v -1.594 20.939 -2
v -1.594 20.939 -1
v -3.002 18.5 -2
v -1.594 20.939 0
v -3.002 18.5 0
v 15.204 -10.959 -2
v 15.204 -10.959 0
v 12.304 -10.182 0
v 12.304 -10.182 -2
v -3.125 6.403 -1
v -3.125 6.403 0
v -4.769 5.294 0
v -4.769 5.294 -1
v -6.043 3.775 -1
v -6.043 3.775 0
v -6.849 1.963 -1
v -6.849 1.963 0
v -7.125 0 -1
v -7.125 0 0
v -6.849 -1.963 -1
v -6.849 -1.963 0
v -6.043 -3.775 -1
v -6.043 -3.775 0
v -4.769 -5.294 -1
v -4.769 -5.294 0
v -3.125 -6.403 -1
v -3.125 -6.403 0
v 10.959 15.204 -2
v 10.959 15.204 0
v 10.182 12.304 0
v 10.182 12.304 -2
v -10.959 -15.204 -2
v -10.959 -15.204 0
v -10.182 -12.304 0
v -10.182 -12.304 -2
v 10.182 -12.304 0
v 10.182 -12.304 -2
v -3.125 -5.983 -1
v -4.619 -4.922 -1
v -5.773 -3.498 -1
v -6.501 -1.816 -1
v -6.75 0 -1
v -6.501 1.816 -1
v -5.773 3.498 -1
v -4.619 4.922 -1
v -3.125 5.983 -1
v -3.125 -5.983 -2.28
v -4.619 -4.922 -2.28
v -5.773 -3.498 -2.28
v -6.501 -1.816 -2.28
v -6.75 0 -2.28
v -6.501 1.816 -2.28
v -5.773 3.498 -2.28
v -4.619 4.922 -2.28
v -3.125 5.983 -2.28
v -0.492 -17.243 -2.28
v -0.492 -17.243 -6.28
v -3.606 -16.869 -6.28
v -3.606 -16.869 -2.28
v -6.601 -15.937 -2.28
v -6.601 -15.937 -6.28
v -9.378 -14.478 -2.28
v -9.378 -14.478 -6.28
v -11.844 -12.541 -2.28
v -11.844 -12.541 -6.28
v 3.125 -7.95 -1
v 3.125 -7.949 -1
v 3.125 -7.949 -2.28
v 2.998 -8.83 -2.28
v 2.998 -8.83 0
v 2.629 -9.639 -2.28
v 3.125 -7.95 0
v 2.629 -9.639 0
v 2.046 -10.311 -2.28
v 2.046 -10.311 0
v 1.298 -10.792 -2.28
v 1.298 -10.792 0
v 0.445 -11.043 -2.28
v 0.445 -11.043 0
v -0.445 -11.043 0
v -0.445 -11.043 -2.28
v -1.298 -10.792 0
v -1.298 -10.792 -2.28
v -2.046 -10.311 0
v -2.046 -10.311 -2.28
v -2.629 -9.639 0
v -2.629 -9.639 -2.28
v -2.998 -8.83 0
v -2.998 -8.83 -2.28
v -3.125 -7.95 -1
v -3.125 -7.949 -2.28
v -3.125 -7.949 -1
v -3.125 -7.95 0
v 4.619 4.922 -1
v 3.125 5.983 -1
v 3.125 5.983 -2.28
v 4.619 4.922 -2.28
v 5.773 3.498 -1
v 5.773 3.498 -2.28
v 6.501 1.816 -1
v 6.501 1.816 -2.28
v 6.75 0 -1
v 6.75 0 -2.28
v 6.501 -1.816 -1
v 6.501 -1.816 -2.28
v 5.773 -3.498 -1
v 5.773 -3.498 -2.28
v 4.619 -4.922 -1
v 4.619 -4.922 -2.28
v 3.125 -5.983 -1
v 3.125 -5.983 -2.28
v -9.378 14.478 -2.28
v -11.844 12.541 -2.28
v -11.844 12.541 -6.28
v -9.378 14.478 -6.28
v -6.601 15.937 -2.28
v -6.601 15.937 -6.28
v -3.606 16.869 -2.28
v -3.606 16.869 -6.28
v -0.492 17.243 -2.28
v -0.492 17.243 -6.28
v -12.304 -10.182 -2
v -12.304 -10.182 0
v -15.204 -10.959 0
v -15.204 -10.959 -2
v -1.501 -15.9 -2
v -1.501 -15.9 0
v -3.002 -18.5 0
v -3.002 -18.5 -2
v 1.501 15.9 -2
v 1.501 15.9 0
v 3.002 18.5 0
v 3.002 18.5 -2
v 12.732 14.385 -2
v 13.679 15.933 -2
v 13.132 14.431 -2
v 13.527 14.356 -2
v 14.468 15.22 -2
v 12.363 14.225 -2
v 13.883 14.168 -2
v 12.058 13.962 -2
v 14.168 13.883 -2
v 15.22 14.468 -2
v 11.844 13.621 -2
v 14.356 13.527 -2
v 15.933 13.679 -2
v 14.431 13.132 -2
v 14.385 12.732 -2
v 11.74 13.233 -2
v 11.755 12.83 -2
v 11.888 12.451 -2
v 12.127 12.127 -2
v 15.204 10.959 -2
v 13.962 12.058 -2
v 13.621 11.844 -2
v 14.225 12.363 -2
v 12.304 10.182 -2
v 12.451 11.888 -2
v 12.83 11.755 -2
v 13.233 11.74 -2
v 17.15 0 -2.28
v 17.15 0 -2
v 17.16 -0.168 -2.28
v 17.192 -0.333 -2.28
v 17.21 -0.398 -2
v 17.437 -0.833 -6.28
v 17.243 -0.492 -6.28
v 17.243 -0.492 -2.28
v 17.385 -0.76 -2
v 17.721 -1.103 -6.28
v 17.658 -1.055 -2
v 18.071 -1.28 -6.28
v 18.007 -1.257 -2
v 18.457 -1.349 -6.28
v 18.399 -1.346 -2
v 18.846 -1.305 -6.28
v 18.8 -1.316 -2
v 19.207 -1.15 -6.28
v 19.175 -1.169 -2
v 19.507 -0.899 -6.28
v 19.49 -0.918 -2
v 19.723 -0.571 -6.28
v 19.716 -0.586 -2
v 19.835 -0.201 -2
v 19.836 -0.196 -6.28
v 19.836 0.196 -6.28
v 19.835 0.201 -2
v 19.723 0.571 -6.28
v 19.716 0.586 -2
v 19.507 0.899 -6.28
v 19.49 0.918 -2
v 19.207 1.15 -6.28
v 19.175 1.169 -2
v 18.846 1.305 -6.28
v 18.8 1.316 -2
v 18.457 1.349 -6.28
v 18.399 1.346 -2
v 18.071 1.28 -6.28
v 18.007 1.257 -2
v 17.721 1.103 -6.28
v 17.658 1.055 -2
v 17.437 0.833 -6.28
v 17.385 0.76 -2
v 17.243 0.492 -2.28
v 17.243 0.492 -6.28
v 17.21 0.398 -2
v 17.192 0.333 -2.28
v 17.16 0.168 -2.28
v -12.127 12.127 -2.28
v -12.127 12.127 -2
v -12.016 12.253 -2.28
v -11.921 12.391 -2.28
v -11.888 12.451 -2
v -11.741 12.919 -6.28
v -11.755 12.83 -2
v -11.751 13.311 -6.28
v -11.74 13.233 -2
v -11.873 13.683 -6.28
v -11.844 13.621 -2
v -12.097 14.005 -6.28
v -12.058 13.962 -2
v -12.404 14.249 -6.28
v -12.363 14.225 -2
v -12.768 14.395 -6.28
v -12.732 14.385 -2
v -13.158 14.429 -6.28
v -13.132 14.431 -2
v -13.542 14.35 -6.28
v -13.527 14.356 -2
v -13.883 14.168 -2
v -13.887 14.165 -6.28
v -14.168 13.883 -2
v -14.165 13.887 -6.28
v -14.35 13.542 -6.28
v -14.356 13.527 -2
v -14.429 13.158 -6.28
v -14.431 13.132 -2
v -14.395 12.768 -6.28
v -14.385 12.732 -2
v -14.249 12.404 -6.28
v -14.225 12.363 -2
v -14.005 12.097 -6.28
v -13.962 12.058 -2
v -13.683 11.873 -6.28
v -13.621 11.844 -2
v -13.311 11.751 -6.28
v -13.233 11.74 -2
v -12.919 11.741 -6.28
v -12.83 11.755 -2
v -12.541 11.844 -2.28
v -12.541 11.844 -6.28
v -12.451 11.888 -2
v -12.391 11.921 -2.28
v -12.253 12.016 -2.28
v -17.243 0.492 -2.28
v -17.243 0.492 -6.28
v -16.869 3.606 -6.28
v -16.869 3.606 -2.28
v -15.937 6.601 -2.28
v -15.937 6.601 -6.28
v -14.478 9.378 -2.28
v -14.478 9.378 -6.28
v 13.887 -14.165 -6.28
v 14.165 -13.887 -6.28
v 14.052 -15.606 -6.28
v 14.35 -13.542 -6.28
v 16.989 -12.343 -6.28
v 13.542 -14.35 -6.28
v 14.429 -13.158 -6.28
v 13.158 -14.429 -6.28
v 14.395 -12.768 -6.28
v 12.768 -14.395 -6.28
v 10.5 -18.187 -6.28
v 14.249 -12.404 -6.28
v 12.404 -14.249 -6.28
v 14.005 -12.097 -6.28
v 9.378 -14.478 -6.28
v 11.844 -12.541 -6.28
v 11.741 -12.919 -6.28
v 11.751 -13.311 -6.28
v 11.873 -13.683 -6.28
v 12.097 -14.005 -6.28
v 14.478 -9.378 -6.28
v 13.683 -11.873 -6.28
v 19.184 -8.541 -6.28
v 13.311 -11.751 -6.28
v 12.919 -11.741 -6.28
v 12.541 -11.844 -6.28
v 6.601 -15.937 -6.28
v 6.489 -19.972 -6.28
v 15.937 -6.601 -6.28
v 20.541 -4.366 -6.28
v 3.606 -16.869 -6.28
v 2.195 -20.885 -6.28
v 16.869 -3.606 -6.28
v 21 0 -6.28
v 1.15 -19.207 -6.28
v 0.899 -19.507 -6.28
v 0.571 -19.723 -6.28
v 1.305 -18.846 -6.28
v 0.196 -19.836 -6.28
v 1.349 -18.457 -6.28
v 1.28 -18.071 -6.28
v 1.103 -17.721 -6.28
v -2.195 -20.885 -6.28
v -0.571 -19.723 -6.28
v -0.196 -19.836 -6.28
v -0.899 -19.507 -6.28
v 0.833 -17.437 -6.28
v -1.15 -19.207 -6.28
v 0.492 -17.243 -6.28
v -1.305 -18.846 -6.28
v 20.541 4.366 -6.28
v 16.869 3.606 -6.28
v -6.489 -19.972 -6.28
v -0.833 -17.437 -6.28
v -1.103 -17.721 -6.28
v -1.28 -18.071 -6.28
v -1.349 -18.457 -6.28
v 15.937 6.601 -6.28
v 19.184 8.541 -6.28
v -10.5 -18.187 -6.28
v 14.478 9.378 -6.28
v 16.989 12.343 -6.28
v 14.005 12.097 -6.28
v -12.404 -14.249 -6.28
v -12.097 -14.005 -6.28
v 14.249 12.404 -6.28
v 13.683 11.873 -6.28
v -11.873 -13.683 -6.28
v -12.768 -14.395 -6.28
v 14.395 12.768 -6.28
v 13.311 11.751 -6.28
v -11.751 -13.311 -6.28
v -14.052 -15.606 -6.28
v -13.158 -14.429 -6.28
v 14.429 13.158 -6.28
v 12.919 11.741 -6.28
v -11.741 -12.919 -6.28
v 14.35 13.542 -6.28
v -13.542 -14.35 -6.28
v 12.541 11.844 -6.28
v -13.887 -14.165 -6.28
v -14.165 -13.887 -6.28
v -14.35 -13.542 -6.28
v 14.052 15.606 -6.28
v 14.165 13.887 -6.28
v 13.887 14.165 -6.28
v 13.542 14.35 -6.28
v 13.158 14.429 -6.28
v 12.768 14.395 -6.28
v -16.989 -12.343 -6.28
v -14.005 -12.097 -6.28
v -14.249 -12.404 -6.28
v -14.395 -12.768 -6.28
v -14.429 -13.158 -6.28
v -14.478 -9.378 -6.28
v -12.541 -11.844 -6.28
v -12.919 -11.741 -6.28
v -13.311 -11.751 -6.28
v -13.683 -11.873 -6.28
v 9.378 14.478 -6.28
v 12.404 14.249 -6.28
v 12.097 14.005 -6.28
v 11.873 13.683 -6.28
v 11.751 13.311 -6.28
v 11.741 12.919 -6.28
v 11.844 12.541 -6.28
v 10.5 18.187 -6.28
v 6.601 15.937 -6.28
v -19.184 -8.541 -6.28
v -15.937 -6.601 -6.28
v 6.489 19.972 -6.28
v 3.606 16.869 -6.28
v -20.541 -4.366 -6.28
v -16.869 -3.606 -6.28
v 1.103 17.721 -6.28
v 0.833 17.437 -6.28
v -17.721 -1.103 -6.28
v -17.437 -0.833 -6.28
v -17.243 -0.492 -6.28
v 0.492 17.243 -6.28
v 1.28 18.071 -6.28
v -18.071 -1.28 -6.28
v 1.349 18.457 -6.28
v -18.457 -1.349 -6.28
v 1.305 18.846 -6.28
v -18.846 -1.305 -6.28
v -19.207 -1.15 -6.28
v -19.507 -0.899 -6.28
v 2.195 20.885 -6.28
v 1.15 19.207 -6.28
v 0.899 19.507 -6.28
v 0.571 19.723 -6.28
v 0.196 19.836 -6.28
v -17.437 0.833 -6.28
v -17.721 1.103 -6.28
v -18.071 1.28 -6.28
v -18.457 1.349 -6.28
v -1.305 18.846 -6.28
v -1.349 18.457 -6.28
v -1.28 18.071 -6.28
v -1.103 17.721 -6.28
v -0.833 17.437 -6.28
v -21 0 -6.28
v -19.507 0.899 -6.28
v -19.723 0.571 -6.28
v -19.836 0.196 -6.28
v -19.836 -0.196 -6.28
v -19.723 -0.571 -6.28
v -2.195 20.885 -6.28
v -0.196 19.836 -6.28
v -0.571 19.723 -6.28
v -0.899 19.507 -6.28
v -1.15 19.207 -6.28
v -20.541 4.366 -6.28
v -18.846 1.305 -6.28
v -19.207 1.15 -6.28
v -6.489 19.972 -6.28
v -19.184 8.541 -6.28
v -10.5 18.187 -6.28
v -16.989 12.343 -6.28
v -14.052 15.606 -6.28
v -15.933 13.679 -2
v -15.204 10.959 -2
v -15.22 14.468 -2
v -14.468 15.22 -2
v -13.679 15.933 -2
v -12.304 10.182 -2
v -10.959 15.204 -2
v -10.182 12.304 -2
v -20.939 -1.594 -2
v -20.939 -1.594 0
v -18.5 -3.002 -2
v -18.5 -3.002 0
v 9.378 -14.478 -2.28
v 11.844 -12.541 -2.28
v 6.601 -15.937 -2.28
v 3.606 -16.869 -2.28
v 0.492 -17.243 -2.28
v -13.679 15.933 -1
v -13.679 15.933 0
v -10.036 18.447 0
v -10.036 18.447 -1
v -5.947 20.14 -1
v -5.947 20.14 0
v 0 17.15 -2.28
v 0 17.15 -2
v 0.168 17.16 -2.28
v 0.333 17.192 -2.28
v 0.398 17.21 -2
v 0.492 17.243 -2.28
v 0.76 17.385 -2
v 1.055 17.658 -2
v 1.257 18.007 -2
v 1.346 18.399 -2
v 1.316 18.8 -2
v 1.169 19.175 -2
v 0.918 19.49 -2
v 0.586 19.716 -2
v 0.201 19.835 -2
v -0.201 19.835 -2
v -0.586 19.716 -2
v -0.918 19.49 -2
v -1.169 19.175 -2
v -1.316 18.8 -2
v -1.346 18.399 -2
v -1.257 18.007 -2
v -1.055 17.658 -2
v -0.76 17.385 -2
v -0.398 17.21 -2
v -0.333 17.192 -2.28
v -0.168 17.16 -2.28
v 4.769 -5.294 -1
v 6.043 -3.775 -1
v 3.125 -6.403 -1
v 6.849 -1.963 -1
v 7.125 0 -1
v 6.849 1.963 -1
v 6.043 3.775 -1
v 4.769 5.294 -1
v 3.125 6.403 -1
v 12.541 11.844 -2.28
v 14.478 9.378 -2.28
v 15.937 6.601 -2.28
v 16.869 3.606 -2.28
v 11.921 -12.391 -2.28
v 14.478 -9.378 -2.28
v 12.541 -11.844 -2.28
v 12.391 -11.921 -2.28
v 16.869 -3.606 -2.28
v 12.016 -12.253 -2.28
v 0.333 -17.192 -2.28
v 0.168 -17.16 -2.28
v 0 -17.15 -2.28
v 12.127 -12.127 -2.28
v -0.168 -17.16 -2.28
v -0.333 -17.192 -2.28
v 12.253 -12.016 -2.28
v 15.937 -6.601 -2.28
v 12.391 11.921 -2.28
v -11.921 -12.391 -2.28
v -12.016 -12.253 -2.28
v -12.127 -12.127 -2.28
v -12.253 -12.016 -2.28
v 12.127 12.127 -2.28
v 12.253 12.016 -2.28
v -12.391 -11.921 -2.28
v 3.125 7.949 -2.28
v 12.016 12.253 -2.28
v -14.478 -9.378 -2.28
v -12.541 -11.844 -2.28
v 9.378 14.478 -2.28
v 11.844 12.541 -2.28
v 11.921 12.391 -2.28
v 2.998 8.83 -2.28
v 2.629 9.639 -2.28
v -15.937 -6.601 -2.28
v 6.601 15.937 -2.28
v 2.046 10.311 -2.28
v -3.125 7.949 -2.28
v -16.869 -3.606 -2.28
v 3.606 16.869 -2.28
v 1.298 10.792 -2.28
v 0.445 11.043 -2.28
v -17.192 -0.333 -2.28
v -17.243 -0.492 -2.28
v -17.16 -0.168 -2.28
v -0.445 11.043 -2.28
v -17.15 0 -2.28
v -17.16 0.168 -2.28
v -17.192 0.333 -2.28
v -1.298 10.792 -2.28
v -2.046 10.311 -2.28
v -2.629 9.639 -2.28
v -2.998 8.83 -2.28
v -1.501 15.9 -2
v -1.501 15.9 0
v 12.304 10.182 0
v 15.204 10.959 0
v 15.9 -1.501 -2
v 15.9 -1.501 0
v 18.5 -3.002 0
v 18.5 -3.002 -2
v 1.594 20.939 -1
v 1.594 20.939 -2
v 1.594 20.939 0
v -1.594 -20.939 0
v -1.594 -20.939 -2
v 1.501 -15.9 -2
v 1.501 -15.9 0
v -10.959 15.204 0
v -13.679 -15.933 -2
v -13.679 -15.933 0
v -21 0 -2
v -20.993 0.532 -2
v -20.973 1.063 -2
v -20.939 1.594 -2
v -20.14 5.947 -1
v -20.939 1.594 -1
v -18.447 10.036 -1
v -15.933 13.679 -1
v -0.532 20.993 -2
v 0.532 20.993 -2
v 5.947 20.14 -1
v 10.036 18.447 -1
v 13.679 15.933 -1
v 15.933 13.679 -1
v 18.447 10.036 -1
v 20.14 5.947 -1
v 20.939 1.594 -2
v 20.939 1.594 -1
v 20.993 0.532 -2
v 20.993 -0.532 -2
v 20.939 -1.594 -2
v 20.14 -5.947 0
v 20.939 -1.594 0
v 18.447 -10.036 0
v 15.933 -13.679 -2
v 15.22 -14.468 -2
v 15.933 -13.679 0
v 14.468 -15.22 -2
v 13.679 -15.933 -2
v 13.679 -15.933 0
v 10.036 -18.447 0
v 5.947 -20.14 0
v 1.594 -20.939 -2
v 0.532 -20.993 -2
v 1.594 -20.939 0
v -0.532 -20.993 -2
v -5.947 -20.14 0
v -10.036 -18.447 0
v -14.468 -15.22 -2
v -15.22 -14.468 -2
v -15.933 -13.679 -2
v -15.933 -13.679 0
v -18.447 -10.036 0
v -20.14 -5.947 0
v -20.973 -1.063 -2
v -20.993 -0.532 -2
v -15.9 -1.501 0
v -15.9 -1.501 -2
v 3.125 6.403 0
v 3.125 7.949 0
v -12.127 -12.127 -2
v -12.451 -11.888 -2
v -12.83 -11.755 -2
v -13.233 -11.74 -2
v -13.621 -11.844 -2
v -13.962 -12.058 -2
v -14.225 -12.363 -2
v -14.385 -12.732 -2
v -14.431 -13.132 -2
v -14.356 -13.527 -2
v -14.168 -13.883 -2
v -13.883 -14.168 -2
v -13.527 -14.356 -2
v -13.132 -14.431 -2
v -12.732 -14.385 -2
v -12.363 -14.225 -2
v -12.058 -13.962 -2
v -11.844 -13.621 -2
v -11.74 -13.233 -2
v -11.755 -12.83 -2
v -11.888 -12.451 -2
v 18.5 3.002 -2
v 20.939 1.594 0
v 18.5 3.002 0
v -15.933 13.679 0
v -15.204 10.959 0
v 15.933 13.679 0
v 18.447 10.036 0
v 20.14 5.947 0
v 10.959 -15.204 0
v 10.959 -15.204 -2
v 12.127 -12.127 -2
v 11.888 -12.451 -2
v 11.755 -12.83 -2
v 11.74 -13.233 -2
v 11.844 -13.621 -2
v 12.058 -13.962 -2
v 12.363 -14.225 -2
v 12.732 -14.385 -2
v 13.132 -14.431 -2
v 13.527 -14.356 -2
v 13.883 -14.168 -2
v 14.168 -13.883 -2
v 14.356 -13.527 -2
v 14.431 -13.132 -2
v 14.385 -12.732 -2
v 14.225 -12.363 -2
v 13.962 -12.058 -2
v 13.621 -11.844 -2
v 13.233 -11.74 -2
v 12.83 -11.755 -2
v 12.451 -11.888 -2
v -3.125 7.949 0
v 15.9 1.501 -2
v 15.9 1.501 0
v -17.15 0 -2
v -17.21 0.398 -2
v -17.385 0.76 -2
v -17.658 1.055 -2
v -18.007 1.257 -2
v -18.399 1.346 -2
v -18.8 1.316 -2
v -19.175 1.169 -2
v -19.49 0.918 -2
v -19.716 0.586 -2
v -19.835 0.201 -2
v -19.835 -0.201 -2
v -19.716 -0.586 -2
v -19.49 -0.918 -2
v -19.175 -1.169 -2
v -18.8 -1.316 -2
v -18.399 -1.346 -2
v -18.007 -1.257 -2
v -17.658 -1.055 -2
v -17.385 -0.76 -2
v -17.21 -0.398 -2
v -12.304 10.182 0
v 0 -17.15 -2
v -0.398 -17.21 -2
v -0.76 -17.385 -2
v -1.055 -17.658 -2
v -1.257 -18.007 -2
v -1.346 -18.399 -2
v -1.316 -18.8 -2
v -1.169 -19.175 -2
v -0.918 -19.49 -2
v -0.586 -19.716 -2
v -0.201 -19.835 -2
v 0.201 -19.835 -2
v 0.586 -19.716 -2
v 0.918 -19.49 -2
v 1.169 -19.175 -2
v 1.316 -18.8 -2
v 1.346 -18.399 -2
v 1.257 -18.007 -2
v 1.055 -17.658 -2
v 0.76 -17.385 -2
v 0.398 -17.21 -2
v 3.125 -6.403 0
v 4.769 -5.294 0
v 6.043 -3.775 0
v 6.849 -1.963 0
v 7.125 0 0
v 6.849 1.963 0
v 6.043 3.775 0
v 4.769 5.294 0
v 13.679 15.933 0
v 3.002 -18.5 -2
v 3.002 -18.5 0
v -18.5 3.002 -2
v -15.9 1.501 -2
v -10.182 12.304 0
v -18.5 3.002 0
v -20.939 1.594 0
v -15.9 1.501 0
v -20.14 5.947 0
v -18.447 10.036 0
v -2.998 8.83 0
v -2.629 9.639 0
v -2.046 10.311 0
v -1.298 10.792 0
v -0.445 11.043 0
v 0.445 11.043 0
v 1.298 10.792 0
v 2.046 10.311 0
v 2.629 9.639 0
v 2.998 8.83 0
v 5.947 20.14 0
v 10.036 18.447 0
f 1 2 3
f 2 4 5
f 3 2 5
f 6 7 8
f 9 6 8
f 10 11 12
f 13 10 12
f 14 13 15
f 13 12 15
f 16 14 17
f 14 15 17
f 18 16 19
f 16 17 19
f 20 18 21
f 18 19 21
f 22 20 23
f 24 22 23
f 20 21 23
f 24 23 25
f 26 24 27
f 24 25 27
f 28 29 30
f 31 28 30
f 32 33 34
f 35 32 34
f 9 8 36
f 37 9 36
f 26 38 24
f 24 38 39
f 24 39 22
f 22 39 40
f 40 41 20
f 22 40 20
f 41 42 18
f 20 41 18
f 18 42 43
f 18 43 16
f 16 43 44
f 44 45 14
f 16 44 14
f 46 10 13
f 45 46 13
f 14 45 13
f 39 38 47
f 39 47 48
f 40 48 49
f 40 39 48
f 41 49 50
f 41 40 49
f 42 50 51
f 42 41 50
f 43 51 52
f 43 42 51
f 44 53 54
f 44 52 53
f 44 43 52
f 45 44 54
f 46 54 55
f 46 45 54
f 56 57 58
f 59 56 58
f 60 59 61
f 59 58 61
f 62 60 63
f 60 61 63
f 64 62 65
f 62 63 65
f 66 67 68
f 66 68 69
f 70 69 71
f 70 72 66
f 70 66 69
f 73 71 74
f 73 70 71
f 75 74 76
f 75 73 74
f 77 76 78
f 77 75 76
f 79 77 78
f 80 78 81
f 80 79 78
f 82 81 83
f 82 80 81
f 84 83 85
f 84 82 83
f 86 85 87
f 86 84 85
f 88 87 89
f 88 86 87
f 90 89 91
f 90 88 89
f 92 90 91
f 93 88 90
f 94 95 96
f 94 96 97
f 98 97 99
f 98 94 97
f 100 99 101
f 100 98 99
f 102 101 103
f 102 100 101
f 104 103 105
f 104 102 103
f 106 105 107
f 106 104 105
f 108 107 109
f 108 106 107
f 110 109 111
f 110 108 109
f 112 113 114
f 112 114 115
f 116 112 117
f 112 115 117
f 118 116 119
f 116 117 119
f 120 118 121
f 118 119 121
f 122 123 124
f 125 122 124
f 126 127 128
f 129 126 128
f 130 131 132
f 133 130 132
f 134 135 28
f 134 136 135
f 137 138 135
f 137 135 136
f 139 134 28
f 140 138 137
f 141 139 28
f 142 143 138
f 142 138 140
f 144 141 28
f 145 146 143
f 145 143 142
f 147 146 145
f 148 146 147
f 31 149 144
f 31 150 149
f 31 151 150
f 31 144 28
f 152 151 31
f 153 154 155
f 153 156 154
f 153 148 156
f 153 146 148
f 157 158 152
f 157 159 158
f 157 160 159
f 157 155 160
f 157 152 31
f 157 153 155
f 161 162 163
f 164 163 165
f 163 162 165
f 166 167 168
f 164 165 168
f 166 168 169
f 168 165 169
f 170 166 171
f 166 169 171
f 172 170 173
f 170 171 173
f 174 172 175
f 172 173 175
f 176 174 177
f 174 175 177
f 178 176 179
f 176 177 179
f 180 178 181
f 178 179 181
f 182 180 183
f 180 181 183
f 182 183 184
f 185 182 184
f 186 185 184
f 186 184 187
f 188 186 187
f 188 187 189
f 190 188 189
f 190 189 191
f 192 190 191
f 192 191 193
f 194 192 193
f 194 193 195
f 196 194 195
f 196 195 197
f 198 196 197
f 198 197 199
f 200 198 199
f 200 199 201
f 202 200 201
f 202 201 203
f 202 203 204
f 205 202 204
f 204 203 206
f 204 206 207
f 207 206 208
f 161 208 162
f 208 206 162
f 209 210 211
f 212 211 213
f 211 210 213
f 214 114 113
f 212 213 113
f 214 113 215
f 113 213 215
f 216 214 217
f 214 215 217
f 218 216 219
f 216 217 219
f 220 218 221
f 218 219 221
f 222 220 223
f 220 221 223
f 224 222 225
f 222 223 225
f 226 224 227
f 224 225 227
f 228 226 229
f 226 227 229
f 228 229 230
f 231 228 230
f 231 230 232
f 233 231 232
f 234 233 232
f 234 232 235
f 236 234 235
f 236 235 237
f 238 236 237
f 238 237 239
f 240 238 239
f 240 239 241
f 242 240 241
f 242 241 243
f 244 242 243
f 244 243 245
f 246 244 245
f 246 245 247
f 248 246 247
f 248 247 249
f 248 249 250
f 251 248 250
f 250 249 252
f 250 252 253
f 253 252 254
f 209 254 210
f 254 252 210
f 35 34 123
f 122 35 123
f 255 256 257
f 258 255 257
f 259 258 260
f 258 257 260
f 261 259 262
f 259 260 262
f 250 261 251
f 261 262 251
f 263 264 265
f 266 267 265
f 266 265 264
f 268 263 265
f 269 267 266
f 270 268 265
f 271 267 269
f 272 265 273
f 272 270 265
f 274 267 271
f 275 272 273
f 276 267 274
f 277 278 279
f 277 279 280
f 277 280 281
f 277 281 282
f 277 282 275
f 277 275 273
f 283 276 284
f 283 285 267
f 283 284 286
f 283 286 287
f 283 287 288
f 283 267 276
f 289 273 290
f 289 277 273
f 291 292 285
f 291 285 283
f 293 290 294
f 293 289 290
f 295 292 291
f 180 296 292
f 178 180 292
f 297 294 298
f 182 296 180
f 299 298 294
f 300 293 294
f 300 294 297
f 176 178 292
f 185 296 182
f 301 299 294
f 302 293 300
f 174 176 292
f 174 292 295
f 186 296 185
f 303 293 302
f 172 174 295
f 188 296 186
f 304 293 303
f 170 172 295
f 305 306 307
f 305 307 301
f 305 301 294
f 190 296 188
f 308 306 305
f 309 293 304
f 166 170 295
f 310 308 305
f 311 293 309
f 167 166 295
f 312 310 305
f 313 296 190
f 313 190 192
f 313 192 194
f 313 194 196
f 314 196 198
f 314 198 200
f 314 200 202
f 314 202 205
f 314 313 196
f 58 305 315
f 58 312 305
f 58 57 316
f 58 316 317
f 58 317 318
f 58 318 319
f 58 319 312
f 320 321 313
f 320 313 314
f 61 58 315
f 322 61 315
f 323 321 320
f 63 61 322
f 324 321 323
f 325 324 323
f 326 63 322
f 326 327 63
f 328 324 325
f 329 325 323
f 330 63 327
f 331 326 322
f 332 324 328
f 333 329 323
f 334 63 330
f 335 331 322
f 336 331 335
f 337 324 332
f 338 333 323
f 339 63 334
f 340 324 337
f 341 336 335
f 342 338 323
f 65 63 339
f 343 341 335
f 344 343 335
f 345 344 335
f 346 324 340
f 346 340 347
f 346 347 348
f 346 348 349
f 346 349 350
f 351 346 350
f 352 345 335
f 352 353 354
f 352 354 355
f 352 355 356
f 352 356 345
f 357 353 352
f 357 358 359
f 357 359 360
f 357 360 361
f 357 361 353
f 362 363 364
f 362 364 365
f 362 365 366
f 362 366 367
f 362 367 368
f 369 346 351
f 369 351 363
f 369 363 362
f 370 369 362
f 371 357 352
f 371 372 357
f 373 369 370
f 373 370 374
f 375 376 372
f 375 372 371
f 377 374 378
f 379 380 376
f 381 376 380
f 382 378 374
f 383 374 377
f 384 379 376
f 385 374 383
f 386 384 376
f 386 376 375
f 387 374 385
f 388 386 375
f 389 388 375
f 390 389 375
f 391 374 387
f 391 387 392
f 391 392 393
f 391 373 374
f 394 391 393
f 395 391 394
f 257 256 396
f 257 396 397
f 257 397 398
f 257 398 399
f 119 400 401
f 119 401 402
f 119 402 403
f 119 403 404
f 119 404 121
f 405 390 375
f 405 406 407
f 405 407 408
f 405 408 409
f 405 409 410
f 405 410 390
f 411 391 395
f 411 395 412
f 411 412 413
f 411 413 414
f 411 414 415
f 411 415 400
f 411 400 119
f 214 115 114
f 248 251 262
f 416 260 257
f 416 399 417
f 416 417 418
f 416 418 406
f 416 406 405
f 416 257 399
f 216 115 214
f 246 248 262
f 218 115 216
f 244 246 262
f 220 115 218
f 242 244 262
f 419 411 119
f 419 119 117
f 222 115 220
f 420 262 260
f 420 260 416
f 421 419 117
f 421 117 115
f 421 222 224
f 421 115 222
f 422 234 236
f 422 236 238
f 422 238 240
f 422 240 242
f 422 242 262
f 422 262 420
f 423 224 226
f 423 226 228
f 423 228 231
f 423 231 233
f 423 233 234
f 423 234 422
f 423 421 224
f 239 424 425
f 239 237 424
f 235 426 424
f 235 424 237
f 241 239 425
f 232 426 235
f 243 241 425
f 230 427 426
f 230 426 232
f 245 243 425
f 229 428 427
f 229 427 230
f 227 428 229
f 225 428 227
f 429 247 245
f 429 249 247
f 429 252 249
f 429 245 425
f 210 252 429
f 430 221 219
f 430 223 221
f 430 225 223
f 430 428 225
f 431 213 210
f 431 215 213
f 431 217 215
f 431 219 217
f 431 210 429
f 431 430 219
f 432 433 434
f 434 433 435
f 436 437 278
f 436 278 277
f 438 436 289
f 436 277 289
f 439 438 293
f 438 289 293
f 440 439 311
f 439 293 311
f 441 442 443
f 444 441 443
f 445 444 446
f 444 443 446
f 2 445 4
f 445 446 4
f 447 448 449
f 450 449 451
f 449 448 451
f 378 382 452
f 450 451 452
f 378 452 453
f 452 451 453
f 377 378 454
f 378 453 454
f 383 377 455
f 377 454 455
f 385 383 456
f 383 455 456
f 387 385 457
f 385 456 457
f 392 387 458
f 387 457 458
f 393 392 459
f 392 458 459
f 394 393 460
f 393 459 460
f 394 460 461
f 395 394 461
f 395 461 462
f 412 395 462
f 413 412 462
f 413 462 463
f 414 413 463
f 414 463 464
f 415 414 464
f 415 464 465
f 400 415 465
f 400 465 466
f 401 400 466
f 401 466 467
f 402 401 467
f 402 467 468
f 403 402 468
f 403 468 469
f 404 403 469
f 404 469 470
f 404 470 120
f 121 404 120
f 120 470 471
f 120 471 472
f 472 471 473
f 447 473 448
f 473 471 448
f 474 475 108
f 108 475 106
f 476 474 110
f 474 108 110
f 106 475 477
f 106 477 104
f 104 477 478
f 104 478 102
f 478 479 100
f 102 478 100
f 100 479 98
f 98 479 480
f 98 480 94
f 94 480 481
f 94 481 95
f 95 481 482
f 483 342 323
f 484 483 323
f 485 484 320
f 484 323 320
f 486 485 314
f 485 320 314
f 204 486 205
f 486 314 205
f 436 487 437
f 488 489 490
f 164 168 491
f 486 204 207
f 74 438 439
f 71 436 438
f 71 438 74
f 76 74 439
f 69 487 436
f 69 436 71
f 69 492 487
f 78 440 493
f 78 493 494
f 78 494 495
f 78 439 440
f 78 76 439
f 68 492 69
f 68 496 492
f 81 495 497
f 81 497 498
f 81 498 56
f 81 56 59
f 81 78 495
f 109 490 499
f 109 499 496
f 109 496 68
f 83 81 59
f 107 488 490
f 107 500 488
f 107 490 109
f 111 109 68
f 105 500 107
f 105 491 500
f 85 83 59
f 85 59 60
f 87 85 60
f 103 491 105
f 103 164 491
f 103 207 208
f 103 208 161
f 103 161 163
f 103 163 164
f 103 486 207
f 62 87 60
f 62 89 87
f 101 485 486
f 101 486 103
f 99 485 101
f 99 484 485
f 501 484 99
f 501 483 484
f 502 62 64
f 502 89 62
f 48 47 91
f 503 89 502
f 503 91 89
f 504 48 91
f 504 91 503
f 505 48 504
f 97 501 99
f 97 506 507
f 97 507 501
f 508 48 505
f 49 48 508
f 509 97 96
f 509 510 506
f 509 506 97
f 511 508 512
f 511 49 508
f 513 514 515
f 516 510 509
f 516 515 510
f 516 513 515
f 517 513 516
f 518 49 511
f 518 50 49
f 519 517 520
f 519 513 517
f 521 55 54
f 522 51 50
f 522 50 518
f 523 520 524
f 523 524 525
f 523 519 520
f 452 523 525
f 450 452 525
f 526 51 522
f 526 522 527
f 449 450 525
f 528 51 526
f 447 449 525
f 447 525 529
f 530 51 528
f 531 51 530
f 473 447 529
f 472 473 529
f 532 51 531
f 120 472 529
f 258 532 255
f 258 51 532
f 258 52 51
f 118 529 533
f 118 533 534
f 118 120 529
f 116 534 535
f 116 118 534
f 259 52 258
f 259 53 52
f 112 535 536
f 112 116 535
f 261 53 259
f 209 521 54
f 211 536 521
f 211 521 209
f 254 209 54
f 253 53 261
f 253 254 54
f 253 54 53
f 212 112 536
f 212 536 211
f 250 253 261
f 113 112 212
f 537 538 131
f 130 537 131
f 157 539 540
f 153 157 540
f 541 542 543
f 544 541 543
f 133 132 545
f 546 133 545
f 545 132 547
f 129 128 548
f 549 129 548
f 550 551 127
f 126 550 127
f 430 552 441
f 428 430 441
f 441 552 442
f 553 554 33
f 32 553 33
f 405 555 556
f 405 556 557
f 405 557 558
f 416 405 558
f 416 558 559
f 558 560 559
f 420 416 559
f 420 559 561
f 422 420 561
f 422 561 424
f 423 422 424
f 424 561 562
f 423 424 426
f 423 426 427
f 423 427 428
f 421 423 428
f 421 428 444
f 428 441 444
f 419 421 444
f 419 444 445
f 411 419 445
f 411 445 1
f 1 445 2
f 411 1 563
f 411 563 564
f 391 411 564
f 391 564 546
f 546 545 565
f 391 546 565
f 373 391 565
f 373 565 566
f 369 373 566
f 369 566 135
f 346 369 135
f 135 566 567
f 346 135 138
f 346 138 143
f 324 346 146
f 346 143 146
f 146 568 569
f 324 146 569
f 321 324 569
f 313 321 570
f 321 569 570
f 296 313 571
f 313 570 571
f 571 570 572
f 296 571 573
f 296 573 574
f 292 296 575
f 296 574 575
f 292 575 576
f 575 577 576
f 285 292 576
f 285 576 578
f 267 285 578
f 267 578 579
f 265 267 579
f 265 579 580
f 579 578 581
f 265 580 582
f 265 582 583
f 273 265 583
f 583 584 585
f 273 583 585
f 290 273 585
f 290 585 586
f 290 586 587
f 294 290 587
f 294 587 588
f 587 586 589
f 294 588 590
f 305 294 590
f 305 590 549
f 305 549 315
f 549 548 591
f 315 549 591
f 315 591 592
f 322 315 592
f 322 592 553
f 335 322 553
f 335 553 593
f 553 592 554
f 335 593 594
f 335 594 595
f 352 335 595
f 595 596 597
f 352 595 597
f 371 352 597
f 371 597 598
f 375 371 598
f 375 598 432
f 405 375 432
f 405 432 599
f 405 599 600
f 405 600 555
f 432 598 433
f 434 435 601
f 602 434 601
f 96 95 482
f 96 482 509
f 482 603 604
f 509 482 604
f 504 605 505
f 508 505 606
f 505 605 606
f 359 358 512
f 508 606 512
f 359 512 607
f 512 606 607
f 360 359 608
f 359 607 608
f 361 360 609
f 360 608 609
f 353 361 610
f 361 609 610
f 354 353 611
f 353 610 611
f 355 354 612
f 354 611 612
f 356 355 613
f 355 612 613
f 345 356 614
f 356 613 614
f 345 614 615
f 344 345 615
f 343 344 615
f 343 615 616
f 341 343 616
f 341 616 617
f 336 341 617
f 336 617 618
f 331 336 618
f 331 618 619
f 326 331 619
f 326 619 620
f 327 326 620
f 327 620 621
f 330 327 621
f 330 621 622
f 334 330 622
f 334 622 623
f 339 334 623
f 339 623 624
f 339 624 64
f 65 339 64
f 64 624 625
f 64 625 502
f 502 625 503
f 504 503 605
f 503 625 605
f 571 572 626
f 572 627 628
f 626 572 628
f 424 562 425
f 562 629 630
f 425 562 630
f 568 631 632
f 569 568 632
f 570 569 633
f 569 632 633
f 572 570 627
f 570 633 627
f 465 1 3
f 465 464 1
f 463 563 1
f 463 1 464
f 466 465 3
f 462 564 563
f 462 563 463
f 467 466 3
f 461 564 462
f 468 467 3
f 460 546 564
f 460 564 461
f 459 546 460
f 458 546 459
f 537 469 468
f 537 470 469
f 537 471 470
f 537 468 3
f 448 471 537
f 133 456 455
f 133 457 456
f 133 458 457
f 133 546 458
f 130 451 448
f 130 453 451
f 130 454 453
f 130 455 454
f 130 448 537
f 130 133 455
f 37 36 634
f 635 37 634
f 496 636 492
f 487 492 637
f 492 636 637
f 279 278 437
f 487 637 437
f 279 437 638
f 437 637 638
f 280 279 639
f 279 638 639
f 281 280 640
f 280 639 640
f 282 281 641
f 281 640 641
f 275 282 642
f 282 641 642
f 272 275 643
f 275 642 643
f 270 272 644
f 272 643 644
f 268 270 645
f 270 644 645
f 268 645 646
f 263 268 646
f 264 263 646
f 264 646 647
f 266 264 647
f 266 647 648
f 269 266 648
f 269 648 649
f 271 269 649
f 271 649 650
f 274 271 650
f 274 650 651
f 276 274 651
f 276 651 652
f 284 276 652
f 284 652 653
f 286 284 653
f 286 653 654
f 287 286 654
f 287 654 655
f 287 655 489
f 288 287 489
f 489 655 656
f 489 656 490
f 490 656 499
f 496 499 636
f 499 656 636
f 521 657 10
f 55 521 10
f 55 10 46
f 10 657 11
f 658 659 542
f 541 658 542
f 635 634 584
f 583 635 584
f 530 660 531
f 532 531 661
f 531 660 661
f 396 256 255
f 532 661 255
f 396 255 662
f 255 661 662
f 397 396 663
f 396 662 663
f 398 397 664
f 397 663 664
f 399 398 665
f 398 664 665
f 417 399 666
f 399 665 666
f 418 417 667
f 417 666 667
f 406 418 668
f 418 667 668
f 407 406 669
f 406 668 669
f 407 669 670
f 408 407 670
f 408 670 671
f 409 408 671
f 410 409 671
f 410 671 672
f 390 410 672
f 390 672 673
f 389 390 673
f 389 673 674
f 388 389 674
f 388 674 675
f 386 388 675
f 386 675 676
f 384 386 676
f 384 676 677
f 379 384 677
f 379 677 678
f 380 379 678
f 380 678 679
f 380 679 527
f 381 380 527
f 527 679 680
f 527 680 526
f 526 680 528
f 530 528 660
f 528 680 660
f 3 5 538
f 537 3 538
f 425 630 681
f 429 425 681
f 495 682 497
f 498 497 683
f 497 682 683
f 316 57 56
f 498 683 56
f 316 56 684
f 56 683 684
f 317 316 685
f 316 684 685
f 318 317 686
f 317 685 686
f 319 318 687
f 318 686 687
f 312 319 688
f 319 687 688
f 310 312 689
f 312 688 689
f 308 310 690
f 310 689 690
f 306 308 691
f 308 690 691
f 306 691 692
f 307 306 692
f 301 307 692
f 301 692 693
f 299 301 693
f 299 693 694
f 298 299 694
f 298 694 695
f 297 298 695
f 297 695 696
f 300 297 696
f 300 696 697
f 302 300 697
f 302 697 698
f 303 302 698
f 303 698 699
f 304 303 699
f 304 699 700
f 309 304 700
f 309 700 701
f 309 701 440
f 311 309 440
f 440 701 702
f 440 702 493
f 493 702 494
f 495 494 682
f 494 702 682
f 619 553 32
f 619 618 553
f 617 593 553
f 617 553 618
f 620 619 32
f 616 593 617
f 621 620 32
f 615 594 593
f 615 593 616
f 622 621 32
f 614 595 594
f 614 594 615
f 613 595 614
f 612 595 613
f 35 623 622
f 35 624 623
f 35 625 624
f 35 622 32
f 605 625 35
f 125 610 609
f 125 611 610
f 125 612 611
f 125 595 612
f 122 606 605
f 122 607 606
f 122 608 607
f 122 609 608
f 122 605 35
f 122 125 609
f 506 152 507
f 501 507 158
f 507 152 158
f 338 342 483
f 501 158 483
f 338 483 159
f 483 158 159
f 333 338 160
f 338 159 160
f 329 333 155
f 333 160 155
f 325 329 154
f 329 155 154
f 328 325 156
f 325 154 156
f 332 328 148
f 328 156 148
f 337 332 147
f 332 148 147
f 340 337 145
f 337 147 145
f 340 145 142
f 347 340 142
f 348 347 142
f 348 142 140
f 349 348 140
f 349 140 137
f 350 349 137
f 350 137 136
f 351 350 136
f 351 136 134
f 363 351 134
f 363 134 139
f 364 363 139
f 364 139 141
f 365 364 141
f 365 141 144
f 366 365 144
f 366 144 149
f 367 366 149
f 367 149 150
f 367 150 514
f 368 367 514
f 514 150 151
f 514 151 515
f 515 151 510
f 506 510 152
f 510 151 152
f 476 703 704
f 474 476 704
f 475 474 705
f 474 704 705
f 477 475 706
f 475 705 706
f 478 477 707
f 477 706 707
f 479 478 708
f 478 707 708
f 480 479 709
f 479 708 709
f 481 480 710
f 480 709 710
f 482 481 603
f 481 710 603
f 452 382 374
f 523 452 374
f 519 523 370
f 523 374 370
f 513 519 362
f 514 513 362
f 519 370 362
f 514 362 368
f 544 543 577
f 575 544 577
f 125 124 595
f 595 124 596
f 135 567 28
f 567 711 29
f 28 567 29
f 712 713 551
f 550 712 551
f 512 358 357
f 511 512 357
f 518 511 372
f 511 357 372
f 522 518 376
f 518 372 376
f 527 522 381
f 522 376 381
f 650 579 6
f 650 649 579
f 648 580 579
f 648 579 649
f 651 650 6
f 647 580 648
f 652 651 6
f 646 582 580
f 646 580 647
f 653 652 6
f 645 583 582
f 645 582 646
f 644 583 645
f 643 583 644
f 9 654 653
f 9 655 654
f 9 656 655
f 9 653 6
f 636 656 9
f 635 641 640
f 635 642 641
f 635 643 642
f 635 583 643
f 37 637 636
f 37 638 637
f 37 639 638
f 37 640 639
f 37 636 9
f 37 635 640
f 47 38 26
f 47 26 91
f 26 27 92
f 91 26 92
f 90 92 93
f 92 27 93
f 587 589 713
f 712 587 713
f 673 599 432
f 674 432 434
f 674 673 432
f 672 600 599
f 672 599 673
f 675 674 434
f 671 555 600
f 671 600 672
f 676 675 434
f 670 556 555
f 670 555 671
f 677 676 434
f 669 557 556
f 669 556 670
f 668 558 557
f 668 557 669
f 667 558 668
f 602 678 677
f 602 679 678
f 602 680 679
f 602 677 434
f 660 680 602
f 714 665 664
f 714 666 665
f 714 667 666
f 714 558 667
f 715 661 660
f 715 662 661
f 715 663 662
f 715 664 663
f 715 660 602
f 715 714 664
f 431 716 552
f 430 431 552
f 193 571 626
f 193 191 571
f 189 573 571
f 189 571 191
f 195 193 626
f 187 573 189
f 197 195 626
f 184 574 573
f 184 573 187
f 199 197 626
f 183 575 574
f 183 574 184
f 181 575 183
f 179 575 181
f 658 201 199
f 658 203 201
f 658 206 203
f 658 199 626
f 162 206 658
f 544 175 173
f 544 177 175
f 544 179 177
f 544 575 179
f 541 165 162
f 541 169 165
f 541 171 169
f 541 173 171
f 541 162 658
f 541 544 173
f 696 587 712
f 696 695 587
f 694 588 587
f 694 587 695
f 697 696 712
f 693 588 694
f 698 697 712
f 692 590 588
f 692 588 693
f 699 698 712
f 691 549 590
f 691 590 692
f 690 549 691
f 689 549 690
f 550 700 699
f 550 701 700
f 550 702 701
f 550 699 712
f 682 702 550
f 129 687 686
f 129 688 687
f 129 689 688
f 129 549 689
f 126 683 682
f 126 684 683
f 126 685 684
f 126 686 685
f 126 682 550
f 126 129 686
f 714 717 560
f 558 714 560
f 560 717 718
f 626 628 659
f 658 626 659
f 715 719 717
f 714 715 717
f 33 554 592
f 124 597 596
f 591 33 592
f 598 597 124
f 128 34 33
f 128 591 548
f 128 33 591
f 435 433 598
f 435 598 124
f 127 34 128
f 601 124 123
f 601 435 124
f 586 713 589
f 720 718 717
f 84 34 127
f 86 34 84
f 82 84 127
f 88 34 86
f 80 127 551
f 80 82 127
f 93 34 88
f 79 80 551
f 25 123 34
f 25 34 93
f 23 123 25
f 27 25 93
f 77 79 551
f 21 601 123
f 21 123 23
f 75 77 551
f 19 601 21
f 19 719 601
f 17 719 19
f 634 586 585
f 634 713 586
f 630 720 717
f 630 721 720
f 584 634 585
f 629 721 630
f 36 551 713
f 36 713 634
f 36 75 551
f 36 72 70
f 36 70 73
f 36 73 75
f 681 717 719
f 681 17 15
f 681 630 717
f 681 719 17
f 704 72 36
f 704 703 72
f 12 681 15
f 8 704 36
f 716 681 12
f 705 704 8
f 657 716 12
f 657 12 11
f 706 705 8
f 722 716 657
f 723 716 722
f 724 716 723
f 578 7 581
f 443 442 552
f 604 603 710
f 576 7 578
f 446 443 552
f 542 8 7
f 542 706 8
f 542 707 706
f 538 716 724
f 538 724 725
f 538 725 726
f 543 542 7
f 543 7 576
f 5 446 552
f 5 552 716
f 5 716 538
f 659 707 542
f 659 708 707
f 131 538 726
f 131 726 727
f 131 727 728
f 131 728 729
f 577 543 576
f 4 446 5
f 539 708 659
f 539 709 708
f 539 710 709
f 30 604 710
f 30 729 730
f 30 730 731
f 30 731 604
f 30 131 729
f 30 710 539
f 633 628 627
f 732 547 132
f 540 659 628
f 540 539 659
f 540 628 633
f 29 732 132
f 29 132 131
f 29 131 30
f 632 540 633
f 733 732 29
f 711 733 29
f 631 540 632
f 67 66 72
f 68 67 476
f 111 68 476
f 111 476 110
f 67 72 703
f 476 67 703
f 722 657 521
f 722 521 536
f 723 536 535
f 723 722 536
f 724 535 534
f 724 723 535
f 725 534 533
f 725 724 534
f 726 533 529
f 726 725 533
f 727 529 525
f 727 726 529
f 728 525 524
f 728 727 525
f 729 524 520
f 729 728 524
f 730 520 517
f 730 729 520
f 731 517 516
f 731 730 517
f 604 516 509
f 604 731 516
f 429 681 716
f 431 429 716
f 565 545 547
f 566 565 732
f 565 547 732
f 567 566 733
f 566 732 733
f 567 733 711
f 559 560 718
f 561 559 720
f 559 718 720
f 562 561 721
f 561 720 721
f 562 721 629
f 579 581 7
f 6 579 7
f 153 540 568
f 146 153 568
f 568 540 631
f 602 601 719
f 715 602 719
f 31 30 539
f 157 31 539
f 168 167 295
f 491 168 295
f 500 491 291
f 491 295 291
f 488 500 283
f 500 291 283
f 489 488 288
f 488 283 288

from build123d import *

# Parameters (mm, degrees)
SKETCH3_R           = 21
BOSS_EXTRUDE2_DEPTH = 1
SKETCH4_R           = 21
BOSS_EXTRUDE3_DEPTH = 5.28
SKETCH5_R           = 17.25
CUT_EXTRUDE1_DEPTH  = 4
CUT_EXTRUDE2_DEPTH  = 2
SKETCH8_R           = 1.35
CUT_EXTRUDE4_DEPTH  = 31.355203837
CIRPATTERN1_COUNT   = 8
CUT_EXTRUDE5_DEPTH  = 31.355203837


with BuildPart() as part:
    # Sketch3 → Boss-Extrude2 (new body)
    with BuildSketch(Plane.XY):
        Circle(SKETCH3_R)
        with BuildLine():
            Line((-3.124988, -6.403130094), (-3.124988, -7.949679))
            Line((-3.124988, -7.949679), (3.125012, -7.949679))
            Line((3.125012, -7.949679), (3.125012, -6.403118381))
            ThreePointArc((3.125012, -6.403118381), (7.125, 0), (3.125012, 6.403118381))
            Line((3.125012, 6.403118381), (3.125012, 7.949431))
            Line((3.125012, 7.949431), (-3.124988, 7.949431))
            Line((-3.124988, 7.949431), (-3.124988, 6.403130094))
            ThreePointArc((-3.124988, 6.403130094), (-7.125, 0), (-3.124988, -6.403130094))
        make_face(mode=Mode.SUBTRACT)
    extrude(amount=-BOSS_EXTRUDE2_DEPTH)

    # Sketch4 → Boss-Extrude3 (add)
    with BuildSketch(Plane(origin=(0, 0, -1), x_dir=(-1, 0, 0), z_dir=(0, 0, -1))):
        Circle(SKETCH4_R)
        with BuildLine():
            Line((2.749988, 6.164419356), (2.749988, 7.574431))
            Line((2.749988, 7.574431), (-2.750012, 7.574431))
            Line((-2.750012, 7.574431), (-2.750012, 6.16440865))
            ThreePointArc((-2.750012, 6.16440865), (-6.75, 0), (-2.750012, -6.16440865))
            Line((-2.750012, -6.16440865), (-2.750012, -7.574679))
            Line((-2.750012, -7.574679), (2.749988, -7.574679))
            Line((2.749988, -7.574679), (2.749988, -6.164419356))
            ThreePointArc((2.749988, -6.164419356), (6.75, 0), (2.749988, 6.164419356))
        make_face(mode=Mode.SUBTRACT)
    extrude(amount=BOSS_EXTRUDE3_DEPTH)

    # Sketch5 → Cut-Extrude1 (cut)
    with BuildSketch(Plane(origin=(0, 0, -6.28), x_dir=(-1, 0, 0), z_dir=(0, 0, -1))):
        Circle(SKETCH5_R)
    extrude(amount=-CUT_EXTRUDE1_DEPTH, mode=Mode.SUBTRACT)

    # Sketch6 → Cut-Extrude2 (cut)
    with BuildSketch(Plane.XY):
        Polygon((-21.1, -1.5011107), (-18.5, -3.0022214), (-15.9, -1.5011107), (-15.9, 1.5011107), (-18.5, 3.0022214), (-21.1, 1.5011107), align=None)
    cut_extrude2 = extrude(amount=-CUT_EXTRUDE2_DEPTH, mode=Mode.SUBTRACT)

    # Sketch8 → Cut-Extrude4 (cut, through all)
    with BuildSketch(Plane.XY):
        with Locations((-18.5, 0)):
            Circle(SKETCH8_R)
    cut_extrude4 = extrude(amount=-CUT_EXTRUDE4_DEPTH, mode=Mode.SUBTRACT)

    # CirPattern1: Cut-Extrude2, Cut-Extrude4 ×8 about axis
    cirpattern1_axis = Axis((0, 0, -6.594), (0, 0, 1))
    add([cut_extrude2.rotate(cirpattern1_axis, i * 360 / CIRPATTERN1_COUNT) for i in range(1, CIRPATTERN1_COUNT)], mode=Mode.SUBTRACT)
    add([cut_extrude4.rotate(cirpattern1_axis, i * 360 / CIRPATTERN1_COUNT) for i in range(1, CIRPATTERN1_COUNT)], mode=Mode.SUBTRACT)

    # Sketch9 → Cut-Extrude5 (cut, through all)
    with BuildSketch(Plane.XY):
        with BuildLine():
            Line((3.125012, 7.949431), (3.125012, -7.949431))
            ThreePointArc((3.125012, -7.949431), (1.2e-05, -11.074431), (-3.124988, -7.949431))
            Line((-3.124988, -7.949431), (-3.124988, 7.949431))
            ThreePointArc((-3.124988, 7.949431), (1.2e-05, 11.074431), (3.125012, 7.949431))
        make_face()
    extrude(amount=-CUT_EXTRUDE5_DEPTH, mode=Mode.SUBTRACT)


solid = part.part
